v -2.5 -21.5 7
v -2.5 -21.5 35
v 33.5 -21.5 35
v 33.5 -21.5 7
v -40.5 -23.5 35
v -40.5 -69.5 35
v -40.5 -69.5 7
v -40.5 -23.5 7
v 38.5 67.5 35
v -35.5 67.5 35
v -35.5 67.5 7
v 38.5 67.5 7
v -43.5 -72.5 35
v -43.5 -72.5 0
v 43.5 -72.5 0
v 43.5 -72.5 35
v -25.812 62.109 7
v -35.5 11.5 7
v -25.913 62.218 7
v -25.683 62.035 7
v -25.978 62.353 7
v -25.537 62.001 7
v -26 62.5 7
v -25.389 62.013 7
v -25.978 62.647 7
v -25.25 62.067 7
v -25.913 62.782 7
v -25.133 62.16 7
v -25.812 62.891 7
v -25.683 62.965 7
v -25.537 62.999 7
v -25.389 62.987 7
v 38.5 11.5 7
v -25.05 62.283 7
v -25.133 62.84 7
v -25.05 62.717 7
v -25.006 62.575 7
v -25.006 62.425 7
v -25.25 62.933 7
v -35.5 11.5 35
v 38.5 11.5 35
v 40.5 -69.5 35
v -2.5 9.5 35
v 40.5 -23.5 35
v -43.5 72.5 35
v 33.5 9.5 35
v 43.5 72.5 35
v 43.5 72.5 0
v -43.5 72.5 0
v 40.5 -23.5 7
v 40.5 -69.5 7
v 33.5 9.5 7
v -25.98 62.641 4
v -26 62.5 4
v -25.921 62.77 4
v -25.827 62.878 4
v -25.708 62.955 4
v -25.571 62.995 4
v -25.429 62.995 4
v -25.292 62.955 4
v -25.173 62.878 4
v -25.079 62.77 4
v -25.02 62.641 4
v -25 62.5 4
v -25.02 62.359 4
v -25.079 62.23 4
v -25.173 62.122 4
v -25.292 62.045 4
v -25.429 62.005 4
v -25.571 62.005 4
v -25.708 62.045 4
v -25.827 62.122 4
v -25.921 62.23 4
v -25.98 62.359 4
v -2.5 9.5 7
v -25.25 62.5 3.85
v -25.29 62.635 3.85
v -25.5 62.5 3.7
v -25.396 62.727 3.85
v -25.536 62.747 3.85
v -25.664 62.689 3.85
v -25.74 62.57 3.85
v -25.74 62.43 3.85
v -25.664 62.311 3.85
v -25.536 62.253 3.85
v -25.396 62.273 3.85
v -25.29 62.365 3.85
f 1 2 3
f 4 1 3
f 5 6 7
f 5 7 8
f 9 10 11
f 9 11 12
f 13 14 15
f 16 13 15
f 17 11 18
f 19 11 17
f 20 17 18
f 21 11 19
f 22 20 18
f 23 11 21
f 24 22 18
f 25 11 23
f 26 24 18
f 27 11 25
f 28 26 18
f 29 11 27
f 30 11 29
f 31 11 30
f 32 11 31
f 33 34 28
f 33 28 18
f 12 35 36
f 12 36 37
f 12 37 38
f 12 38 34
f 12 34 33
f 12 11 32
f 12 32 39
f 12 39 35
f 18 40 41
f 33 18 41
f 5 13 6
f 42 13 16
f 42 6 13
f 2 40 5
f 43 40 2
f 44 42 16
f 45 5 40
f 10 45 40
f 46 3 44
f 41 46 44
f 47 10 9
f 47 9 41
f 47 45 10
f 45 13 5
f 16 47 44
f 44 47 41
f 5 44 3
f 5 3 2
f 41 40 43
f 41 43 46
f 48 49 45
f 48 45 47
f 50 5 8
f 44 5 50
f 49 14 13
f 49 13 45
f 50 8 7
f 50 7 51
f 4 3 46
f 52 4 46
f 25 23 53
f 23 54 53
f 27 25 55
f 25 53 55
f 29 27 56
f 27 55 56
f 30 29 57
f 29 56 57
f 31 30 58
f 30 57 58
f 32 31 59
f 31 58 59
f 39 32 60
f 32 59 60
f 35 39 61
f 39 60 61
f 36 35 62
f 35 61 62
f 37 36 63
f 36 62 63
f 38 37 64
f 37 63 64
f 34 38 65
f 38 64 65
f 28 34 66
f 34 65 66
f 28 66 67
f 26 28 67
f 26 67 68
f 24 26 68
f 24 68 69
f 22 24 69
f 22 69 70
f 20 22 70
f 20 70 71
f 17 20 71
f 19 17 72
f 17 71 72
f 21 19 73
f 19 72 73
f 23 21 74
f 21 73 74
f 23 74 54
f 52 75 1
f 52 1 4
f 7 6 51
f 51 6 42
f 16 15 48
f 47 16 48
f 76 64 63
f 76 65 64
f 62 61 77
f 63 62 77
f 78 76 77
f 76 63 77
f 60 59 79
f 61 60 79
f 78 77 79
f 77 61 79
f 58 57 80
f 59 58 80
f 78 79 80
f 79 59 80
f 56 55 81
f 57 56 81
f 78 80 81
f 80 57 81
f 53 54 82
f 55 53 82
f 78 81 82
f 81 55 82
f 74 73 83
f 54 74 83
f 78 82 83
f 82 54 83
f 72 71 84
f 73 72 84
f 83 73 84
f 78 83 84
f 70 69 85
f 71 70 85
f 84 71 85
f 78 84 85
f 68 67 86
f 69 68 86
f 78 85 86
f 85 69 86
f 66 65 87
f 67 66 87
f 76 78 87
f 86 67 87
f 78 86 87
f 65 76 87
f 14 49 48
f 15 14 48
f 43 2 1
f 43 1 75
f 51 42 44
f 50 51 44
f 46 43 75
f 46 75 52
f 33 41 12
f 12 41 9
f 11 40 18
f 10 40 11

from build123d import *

# Parameters (mm, degrees)
F0_W     = 87
F0_H     = 145
F1_DEPTH = 35
F2_W     = 74
F2_H     = 56
F2_W_2   = 36
F2_H_2   = 31
F2_W_3   = 81
F2_H_3   = 46
F3_DEPTH = 28
F4_D     = 1
F4_DEPTH = 3
F4_START = 28
F4_TIP   = 0.3004303095


with BuildPart() as f1:
    # F0 (on Top) → F1 (new body)
    with BuildSketch(Plane.XY):
        Rectangle(F0_W, F0_H)
    extrude(amount=F1_DEPTH)

    # F2 (on face) → F3 (cut)
    with BuildSketch(Plane.XY.offset(35)):
        with Locations((1.5, 39.5)):
            Rectangle(F2_W, F2_H)
        with Locations((15.5, -6)):
            Rectangle(F2_W_2, F2_H_2)
        with Locations((0, -46.5)):
            Rectangle(F2_W_3, F2_H_3)
    extrude(amount=-F3_DEPTH, mode=Mode.SUBTRACT)

    # F4
    # its depths count from where the whole tool has entered the part; down to there all is cleared
    with Locations(Plane.XY.offset(35)):
        with Locations((-25.5, 62.5)):
            Hole(F4_D / 2, depth=F4_START)
    with Locations(Plane.XY.offset(35).offset(-F4_START)):
        with Locations((-25.5, 62.5)):
            Hole(F4_D / 2, depth=F4_DEPTH)
            with Locations((0, 0, -(F4_DEPTH + F4_TIP / 2))):  # 118° drill point
                Cone(0, F4_D / 2, F4_TIP, mode=Mode.SUBTRACT)


solid = f1.part
